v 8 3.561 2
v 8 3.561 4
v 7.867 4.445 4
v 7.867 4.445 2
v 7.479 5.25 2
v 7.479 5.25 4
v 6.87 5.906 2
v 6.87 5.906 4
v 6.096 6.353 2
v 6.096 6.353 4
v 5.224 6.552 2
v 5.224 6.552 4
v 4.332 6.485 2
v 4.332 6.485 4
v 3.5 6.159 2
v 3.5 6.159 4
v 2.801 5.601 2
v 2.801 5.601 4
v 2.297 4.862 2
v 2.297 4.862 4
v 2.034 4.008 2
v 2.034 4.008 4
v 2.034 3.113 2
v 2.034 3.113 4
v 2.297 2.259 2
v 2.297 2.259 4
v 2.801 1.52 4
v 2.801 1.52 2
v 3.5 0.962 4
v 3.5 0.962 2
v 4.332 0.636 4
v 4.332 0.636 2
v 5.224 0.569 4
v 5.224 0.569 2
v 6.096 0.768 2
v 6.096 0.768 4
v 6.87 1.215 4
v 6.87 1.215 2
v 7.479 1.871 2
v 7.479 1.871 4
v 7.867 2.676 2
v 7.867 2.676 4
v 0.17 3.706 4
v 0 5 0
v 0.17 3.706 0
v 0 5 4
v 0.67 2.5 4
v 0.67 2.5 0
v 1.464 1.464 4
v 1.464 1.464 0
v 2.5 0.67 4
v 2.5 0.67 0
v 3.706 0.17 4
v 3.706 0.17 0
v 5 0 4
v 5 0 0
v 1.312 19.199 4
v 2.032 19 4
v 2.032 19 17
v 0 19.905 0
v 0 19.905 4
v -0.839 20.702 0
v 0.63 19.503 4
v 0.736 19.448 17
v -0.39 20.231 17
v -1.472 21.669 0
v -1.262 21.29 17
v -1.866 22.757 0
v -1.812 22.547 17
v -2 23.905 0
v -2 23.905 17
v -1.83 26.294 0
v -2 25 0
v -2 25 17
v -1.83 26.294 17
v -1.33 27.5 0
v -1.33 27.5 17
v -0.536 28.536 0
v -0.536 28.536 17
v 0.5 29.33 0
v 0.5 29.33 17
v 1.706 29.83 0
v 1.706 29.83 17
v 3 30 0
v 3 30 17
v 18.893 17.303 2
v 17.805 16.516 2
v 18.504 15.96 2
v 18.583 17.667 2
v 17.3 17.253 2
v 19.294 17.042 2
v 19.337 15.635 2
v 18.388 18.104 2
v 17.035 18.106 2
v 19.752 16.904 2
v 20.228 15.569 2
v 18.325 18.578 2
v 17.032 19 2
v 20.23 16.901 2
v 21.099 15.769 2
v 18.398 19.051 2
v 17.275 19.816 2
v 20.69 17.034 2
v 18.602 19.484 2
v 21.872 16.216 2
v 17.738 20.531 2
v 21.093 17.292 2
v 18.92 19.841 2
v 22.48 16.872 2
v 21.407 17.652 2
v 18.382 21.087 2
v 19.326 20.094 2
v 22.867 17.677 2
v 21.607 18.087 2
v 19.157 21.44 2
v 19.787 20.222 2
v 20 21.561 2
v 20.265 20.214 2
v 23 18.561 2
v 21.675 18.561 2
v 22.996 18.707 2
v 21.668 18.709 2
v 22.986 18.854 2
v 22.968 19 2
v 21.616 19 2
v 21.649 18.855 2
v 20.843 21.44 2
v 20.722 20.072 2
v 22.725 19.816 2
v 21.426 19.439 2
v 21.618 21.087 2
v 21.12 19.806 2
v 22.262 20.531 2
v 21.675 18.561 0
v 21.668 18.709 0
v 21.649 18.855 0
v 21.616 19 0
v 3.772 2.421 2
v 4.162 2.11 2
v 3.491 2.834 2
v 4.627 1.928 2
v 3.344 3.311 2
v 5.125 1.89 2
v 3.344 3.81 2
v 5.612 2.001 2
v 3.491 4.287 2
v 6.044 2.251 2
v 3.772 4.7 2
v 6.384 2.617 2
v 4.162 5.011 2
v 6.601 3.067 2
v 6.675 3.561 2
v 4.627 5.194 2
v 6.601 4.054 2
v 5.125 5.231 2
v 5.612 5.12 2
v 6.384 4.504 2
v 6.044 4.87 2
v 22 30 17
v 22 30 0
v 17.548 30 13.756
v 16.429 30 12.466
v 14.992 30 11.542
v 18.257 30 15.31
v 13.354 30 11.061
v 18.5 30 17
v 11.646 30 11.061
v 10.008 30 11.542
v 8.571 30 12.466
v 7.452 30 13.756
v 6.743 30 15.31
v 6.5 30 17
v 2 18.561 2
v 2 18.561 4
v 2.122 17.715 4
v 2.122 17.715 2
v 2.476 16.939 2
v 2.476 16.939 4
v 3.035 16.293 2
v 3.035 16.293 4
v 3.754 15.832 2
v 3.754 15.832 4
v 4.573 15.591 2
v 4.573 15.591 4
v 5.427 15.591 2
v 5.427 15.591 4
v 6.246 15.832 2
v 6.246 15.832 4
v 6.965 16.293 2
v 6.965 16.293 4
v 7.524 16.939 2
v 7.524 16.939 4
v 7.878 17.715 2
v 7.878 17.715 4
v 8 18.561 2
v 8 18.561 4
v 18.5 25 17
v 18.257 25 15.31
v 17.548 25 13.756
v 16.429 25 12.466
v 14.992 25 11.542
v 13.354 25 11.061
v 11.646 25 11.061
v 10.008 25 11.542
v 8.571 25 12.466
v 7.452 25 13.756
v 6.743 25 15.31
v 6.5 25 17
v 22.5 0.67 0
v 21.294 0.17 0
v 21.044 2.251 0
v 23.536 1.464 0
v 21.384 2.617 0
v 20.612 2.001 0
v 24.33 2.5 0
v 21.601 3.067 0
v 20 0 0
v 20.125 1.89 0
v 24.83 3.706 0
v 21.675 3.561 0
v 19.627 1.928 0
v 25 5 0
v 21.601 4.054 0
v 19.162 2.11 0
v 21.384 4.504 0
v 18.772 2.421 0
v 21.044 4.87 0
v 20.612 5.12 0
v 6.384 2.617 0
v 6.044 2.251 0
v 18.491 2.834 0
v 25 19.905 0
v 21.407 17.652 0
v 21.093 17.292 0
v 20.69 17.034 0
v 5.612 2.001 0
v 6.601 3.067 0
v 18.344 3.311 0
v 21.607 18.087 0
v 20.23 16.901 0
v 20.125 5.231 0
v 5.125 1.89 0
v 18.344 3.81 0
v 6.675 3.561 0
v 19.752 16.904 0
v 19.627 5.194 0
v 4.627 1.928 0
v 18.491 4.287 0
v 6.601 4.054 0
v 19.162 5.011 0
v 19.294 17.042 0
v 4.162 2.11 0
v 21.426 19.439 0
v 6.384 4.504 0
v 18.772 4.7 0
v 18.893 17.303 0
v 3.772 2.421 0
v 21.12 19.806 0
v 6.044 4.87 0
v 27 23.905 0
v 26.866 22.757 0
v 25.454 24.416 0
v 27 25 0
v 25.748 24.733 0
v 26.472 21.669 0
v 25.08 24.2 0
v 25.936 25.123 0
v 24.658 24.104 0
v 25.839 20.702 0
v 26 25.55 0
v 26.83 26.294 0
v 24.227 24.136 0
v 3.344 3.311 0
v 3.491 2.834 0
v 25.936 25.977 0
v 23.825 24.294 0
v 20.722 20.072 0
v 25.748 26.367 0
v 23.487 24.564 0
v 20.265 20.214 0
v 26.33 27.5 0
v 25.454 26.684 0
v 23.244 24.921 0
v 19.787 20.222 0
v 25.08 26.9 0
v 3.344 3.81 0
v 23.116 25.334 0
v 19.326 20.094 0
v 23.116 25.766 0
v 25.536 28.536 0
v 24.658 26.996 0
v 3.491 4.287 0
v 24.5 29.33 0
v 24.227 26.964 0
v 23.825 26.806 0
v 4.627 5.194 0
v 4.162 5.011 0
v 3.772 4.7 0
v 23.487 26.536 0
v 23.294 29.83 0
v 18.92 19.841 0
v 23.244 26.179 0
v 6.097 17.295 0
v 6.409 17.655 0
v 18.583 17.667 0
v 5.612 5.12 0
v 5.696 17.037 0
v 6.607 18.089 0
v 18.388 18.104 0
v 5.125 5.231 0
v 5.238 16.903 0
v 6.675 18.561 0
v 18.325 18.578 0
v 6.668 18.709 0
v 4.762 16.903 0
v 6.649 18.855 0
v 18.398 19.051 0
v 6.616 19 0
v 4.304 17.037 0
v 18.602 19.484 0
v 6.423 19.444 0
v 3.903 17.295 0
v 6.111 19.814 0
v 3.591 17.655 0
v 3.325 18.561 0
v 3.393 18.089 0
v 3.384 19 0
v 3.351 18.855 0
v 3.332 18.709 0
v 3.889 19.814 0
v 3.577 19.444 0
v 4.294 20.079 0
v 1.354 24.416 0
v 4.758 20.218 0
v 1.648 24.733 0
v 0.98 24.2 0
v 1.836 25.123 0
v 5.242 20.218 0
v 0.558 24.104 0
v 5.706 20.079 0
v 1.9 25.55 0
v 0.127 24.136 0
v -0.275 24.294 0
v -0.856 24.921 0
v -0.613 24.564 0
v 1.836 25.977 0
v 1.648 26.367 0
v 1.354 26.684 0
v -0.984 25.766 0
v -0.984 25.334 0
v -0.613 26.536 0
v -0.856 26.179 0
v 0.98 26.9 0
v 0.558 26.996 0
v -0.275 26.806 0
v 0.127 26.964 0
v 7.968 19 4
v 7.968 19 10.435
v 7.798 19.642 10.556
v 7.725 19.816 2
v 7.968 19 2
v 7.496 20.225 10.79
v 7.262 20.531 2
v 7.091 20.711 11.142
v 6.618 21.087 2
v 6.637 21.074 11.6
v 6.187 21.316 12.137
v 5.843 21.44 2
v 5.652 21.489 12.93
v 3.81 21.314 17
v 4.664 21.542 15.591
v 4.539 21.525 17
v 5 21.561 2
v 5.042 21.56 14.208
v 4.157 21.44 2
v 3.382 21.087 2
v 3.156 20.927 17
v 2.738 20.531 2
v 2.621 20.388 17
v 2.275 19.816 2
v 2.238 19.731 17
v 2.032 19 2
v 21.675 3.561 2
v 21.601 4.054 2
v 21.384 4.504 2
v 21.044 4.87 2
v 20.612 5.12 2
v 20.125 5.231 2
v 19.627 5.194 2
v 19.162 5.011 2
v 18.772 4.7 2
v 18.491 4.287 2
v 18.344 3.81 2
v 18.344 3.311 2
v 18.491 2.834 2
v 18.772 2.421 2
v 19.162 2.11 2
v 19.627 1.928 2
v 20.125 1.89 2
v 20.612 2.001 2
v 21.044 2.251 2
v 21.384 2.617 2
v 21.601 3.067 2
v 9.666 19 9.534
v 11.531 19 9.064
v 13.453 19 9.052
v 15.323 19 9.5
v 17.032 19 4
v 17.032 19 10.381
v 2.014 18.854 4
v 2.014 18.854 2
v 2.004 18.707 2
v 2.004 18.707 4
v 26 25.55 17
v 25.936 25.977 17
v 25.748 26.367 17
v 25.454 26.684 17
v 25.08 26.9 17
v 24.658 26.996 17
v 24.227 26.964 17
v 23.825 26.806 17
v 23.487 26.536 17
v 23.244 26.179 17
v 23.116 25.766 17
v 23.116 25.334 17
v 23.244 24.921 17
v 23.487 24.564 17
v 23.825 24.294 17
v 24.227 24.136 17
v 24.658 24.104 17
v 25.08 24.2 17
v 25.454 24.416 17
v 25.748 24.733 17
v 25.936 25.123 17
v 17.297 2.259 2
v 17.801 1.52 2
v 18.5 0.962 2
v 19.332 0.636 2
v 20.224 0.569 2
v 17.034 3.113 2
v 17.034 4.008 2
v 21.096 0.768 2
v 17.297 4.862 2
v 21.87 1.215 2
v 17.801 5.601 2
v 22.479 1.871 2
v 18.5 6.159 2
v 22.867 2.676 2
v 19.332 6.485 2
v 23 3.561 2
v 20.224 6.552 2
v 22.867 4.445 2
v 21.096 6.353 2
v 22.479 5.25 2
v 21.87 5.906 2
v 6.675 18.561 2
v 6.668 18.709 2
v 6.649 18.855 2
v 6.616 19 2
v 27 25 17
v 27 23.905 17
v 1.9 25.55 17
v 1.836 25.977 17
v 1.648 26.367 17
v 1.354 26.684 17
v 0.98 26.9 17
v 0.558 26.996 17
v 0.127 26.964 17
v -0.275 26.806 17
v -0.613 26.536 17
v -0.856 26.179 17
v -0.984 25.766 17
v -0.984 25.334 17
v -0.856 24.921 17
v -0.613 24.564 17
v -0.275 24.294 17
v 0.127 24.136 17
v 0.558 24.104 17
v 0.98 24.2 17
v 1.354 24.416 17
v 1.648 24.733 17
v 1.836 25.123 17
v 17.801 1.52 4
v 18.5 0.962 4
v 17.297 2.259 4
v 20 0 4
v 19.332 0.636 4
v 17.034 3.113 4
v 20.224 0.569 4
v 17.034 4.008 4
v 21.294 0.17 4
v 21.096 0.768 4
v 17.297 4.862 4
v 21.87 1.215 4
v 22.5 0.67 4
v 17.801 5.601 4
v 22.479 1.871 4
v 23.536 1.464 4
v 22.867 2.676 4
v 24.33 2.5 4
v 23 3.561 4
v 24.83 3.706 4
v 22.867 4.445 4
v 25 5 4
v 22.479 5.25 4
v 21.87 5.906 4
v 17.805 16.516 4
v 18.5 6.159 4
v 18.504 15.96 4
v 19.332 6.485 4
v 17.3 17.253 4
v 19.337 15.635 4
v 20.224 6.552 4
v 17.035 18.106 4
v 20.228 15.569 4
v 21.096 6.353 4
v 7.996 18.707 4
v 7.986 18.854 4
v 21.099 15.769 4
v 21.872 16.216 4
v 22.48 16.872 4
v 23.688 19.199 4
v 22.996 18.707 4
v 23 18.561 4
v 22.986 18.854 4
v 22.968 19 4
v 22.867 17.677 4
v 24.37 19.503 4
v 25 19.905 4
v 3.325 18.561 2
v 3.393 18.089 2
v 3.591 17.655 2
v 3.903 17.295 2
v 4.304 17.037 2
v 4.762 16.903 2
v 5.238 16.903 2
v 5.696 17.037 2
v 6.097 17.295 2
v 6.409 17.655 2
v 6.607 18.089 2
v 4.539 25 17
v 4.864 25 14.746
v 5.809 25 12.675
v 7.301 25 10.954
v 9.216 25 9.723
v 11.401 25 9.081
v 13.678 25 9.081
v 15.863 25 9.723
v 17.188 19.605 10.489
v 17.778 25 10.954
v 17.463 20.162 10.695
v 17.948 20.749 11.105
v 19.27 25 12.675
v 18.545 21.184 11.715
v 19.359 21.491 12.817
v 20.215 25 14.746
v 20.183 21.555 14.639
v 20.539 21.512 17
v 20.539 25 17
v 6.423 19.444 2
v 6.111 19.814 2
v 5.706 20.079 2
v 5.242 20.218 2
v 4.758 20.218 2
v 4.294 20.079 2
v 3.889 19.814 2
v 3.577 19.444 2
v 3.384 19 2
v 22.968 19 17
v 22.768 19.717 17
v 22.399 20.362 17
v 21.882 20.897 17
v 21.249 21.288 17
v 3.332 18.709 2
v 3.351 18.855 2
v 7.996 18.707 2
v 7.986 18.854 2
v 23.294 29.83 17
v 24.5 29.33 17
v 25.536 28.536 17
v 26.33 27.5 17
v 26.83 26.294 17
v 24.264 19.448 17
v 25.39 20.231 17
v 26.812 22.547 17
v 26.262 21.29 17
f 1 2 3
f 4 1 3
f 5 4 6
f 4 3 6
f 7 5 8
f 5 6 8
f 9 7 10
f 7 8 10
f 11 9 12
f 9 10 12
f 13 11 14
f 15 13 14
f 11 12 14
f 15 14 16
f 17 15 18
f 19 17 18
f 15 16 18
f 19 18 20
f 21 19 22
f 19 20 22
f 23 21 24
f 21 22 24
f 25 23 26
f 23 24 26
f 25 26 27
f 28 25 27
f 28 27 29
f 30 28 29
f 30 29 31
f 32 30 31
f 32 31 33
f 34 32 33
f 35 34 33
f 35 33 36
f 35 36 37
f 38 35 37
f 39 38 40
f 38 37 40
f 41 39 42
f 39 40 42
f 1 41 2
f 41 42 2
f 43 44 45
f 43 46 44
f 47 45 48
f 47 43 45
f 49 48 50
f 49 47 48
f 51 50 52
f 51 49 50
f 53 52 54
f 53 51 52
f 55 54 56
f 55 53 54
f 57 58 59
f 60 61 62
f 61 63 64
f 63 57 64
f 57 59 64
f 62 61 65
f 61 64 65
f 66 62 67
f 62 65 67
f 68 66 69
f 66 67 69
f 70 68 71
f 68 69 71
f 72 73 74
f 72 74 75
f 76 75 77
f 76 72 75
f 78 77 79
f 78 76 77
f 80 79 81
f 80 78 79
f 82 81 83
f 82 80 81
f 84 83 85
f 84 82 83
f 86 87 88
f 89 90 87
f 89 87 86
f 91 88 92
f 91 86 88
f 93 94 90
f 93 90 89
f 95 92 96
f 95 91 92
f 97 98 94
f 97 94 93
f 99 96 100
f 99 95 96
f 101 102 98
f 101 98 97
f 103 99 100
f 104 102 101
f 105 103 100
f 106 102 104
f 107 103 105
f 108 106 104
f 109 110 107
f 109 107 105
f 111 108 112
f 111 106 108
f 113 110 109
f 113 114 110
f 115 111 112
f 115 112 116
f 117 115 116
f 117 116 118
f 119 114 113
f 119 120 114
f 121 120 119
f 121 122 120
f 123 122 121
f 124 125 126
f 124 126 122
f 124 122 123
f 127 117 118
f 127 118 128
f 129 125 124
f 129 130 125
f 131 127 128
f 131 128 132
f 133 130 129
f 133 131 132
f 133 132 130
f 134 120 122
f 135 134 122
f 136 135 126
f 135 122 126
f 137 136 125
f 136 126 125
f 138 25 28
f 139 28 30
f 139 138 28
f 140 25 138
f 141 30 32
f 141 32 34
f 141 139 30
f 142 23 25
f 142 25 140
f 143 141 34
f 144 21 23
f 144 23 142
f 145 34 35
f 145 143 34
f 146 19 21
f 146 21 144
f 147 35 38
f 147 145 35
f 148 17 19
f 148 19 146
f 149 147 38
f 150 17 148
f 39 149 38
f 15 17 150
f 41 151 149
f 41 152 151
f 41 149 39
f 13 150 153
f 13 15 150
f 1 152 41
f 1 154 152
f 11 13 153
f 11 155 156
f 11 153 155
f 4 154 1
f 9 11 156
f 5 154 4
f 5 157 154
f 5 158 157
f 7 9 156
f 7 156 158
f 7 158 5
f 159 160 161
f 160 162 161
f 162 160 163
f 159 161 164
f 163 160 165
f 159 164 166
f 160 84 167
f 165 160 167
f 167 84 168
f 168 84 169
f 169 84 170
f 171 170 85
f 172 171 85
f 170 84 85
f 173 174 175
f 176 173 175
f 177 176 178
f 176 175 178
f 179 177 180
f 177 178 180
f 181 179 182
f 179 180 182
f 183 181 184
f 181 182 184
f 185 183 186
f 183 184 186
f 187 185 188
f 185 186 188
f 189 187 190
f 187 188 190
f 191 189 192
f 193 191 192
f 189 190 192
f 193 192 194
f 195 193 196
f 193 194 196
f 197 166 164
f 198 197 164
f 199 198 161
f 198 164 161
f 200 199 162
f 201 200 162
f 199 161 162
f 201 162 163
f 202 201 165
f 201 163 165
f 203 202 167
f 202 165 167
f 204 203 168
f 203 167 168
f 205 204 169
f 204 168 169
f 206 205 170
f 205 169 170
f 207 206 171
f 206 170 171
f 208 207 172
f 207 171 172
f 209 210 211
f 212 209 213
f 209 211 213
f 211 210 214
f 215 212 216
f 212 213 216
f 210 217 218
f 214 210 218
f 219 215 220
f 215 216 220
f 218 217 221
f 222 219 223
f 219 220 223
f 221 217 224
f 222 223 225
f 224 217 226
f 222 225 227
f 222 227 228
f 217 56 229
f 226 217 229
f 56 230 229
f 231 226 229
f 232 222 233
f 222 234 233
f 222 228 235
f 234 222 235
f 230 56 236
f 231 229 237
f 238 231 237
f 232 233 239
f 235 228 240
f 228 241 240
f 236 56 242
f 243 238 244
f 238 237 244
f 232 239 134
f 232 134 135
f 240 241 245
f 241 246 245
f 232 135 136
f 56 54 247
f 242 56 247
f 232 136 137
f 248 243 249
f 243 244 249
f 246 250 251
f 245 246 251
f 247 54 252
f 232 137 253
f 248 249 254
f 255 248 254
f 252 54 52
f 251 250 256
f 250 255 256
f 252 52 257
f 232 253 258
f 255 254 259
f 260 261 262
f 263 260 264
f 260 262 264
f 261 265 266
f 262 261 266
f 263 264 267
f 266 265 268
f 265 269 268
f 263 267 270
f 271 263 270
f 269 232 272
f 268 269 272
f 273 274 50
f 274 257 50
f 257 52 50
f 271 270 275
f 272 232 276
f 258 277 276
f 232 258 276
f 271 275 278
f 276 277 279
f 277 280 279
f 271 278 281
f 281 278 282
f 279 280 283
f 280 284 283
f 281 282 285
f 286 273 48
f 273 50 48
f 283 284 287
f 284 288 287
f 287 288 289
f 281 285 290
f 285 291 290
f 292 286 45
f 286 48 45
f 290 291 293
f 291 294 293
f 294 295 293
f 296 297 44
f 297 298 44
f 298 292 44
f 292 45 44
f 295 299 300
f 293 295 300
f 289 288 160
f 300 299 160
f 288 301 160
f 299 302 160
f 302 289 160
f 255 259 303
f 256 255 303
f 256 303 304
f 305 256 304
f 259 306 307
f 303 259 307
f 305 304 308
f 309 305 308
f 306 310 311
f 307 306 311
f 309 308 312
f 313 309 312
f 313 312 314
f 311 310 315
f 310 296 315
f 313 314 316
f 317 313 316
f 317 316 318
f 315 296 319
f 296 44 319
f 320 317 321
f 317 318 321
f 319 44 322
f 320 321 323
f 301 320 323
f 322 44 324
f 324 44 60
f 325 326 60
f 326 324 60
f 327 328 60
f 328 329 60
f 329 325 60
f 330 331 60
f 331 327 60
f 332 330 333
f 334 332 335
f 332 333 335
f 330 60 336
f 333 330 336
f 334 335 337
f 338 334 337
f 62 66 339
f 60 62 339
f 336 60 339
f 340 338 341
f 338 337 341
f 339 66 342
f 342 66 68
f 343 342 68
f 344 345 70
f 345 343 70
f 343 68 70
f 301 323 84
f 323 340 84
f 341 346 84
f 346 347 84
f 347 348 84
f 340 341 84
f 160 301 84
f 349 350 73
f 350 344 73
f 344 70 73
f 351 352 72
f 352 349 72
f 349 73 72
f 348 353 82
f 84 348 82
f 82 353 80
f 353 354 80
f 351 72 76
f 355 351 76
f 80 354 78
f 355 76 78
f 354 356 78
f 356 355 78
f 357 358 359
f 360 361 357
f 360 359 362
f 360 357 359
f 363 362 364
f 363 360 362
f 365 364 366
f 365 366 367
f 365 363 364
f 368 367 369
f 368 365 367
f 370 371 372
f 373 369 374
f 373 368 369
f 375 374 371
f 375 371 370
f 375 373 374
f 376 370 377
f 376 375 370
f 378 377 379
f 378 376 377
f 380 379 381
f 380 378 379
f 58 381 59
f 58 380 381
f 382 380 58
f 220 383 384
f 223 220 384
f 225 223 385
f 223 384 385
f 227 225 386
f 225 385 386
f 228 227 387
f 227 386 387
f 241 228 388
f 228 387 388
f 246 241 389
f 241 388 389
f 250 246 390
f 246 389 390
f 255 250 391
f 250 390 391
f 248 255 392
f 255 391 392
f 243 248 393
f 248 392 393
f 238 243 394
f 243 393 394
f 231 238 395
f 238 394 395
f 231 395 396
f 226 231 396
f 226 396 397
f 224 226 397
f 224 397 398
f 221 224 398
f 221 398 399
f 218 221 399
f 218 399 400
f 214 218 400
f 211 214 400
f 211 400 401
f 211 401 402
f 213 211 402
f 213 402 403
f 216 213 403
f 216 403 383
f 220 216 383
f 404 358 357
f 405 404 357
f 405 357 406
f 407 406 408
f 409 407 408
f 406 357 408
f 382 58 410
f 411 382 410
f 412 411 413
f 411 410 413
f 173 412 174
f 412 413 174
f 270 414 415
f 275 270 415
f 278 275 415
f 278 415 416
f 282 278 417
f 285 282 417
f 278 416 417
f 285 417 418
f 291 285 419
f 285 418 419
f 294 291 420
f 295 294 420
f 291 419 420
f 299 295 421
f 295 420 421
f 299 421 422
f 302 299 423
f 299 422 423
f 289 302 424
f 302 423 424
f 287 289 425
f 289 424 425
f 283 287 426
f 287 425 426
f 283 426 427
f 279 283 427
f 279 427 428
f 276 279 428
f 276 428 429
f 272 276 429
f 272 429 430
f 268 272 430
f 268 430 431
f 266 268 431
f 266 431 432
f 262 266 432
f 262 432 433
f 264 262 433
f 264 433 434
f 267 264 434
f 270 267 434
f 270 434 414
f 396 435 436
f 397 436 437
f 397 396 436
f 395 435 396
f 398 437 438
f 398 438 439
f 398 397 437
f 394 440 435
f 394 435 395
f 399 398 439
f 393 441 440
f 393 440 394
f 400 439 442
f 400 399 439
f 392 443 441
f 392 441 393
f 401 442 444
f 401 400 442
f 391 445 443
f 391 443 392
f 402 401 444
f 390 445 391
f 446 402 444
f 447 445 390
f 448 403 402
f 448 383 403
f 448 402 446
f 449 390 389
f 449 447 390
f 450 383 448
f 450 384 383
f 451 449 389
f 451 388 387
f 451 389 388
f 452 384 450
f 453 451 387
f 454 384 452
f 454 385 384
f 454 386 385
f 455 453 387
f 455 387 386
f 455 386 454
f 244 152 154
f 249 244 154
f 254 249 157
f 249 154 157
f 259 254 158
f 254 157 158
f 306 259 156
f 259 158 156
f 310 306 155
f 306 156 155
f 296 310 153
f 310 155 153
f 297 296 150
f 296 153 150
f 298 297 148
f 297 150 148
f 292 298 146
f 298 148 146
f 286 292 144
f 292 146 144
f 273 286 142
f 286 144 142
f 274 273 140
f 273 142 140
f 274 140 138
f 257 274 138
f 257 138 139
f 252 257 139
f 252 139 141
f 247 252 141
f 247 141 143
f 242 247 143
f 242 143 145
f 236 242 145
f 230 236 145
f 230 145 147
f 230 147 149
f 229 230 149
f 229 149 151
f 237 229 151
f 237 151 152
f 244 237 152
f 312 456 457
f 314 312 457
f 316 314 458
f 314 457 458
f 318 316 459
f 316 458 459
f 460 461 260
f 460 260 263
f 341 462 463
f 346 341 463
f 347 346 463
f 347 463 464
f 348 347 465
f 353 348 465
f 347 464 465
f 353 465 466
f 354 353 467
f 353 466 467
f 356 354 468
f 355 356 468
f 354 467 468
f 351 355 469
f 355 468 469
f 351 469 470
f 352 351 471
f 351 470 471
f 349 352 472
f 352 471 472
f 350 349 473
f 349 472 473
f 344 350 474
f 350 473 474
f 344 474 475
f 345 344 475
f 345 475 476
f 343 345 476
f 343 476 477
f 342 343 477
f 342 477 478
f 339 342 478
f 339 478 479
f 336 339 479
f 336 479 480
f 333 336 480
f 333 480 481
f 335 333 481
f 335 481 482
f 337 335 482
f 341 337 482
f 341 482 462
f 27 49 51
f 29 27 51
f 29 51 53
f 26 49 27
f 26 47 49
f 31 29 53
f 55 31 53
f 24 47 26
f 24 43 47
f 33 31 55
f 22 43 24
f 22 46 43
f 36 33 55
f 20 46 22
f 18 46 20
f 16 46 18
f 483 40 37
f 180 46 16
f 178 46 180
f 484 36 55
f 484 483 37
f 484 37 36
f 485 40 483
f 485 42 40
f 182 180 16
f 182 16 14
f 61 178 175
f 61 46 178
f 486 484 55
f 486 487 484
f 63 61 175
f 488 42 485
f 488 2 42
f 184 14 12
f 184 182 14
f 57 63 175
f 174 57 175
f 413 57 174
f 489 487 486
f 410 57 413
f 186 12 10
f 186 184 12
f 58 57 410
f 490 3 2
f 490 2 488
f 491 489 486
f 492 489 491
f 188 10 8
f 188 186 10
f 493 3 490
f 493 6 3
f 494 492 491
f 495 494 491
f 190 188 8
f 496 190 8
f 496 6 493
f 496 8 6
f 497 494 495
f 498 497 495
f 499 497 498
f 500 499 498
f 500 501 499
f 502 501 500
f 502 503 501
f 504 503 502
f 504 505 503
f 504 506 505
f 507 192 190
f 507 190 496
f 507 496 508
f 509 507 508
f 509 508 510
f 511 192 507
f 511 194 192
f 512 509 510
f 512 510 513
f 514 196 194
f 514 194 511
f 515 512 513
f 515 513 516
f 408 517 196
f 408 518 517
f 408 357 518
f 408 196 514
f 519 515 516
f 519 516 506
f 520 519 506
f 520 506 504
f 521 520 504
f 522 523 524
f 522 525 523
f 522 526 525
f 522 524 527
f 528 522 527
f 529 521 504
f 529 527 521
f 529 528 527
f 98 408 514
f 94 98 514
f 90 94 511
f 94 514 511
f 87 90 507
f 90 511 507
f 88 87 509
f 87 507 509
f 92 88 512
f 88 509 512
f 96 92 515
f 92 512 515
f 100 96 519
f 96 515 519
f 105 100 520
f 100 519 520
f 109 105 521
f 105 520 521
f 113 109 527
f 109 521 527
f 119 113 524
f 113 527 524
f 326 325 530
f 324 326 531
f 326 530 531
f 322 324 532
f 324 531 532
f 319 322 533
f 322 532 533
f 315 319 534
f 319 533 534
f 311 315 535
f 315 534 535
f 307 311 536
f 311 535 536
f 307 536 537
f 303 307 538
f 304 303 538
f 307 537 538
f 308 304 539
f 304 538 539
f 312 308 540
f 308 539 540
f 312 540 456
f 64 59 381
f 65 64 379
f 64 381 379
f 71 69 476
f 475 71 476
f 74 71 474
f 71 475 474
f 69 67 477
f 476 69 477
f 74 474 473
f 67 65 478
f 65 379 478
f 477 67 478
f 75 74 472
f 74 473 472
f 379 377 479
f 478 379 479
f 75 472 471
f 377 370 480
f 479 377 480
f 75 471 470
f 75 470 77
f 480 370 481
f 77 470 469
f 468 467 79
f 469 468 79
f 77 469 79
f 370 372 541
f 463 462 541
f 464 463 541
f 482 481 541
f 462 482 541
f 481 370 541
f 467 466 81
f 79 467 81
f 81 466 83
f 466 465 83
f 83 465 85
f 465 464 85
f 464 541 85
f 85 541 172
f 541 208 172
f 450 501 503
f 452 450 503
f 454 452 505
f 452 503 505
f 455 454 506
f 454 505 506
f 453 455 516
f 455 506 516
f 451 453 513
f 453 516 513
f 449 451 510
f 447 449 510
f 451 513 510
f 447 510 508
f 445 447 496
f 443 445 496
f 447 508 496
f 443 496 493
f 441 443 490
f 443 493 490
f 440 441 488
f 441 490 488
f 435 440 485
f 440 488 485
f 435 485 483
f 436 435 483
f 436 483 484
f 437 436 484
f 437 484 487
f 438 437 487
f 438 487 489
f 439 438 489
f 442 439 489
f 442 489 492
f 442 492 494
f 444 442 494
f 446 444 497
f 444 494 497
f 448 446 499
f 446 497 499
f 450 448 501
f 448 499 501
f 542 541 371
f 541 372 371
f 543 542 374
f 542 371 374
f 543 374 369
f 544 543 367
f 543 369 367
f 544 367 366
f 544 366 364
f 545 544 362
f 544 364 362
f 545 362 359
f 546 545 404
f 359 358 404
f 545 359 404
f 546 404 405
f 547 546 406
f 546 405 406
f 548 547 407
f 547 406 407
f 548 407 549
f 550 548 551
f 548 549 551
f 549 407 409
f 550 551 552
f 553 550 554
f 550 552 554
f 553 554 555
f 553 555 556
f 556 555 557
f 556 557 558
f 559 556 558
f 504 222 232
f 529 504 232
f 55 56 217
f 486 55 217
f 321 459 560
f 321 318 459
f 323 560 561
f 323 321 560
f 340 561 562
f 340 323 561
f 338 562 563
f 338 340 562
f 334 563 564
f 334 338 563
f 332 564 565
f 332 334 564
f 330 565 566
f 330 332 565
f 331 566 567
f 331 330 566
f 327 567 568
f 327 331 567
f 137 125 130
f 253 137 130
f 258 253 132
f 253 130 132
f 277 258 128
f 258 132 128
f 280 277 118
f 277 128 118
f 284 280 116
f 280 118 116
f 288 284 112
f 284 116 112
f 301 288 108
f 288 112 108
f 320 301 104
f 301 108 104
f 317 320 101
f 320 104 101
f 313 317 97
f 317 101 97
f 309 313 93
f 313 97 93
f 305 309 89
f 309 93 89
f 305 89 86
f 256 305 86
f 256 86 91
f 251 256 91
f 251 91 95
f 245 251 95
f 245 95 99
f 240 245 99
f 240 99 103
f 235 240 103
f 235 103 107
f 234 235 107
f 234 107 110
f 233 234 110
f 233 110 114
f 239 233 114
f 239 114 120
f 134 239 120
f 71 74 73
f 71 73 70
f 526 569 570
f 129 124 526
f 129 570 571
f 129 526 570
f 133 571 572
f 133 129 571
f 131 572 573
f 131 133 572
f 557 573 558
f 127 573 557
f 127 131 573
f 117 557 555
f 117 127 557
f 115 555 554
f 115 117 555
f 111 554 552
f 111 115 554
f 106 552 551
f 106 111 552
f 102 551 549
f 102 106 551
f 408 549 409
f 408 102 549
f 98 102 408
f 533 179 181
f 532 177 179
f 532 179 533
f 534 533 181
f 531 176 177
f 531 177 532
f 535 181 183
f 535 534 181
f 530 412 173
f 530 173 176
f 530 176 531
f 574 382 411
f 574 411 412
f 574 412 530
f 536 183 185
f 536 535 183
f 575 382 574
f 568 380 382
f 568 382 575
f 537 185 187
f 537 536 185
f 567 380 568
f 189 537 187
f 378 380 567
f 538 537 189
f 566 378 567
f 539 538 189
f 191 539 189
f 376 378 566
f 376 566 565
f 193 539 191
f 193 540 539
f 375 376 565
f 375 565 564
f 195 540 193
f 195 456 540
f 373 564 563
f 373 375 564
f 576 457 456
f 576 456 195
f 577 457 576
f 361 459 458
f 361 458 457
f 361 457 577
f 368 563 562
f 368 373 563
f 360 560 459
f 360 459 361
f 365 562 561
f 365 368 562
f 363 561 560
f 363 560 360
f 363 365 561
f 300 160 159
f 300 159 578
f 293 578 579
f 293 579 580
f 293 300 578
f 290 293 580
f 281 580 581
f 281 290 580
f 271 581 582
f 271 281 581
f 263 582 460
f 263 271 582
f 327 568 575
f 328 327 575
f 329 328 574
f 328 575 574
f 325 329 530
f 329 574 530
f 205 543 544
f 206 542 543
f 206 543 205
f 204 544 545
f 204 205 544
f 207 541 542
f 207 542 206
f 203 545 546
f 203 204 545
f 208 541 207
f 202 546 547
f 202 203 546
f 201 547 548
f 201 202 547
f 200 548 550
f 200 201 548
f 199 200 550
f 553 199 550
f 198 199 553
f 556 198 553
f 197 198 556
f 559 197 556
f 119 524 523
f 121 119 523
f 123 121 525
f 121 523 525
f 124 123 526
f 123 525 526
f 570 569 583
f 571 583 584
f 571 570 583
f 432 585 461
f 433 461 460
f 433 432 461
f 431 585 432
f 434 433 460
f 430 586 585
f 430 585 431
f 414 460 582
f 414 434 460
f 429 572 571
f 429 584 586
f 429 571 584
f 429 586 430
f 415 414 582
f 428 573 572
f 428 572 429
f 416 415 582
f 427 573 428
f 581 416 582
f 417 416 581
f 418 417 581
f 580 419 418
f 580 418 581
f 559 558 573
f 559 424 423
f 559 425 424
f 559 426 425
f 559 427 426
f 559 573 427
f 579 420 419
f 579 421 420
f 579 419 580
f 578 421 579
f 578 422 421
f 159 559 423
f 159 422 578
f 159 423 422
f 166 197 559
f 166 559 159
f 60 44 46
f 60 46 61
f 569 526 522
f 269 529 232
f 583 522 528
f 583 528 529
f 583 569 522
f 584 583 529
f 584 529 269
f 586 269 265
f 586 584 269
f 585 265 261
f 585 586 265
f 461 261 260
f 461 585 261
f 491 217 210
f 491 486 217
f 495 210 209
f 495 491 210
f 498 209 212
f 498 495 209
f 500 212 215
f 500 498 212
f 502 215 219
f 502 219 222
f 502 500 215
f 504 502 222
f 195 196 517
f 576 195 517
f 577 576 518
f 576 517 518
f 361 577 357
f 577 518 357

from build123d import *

# Parameters (mm, degrees)
F0_W           = 25
F0_H           = 30
F1_DEPTH       = 4
F2_W           = 25
F2_H           = 11
F3_DEPTH       = 13
F4_R           = 1.675
F5_DEPTH       = 25
F5_DEPTH_BACK  = 25
F7_DEPTH       = 6
F8_R           = 8
F9_DEPTH       = 6
F4_R_2         = 3
F10_DEPTH      = 2
F10_DEPTH_BACK = 25
F11_R          = 5
F13_DEPTH      = 2
F14_W          = 11
F14_H          = 17
F15_DEPTH      = 2
F16_R          = 1.45
F17_DEPTH      = 25
F18_T1_DEPTH   = 42
F18_T6_DEPTH   = 41.5273716251
F18_T11_DEPTH  = 41.5273716251
F18_T16_DEPTH  = 41.5273716251
F18_T21_DEPTH  = 41.5273716251


# Not quite as in the source:
# - a fillet or chamfer that OpenCascade refuses, or shapes differently, is made with other operations: its cross-section is extruded or revolved along the edge and cut away or added


with BuildPart() as f1:
    # F0 (on Top) → F1 (new body)
    with BuildSketch(Plane.XY):
        with Locations((12.5, 15)):
            Rectangle(F0_W, F0_H)
    extrude(amount=F1_DEPTH)

    # F2 (on face) → F3 (join)
    with BuildSketch(Plane.XY.offset(4)):
        with Locations((12.5, 24.5)):
            Rectangle(F2_W, F2_H)
    extrude(amount=F3_DEPTH)

    # F4 (on face) → F5 (cut, two sides)
    with BuildSketch(Plane.XY.offset(4)) as f5_sk:
        with BuildLine():
            ThreePointArc((3.325, 18.5605346784), (5, 16.8855346784), (6.675, 18.5605346784))
            ThreePointArc((6.675, 18.5605346784), (6.6602655711, 18.7822174099), (6.6163215123, 19))
            Line((6.6163215123, 19), (3.3836784877, 19))
            ThreePointArc((3.3836784877, 19), (3.3397344289, 18.7822174099), (3.325, 18.5605346784))
        make_face()
        with BuildLine():
            ThreePointArc((21.6163215123, 19), (20, 20.2355346784), (18.3836784877, 19))
            Line((18.3836784877, 19), (21.6163215123, 19))
        make_face()
        with BuildLine():
            Line((21.6163215123, 19), (18.3836784877, 19))
            ThreePointArc((18.3836784877, 19), (19.7783172685, 16.9002691073), (21.675, 18.5605346784))
            ThreePointArc((21.675, 18.5605346784), (21.6602655711, 18.7822174099), (21.6163215123, 19))
        make_face()
        with Locations((20, 3.5605346784)):
            Circle(F4_R)
        with Locations((5, 3.5605346784)):
            Circle(F4_R)
        with BuildLine():
            Line((3.3836784877, 19), (6.6163215123, 19))
            ThreePointArc((6.6163215123, 19), (5, 20.2355346784), (3.3836784877, 19))
        make_face()
    extrude(amount=-F5_DEPTH, mode=Mode.SUBTRACT)
    extrude(f5_sk.sketch, amount=F5_DEPTH_BACK, mode=Mode.SUBTRACT)

    # F6 (on face) → F7 (cut)
    with BuildSketch(Plane(origin=(0, 30, 0), x_dir=(-1, 0, 0), z_dir=(0, 1, 0))):
        with BuildLine():
            ThreePointArc((-18.5, 17), (-12.5, 11), (-6.5, 17))
            Line((-6.5, 17), (-18.5, 17))
        make_face()
    extrude(amount=-F7_DEPTH, mode=Mode.SUBTRACT)

    # F8 (on face) → F9 (cut)
    with BuildSketch(Plane.XZ.offset(-19)):
        with Locations((12.5394891948, 17)):
            Circle(F8_R)
    extrude(amount=-F9_DEPTH, mode=Mode.SUBTRACT)

    # F4 (on face) → F10 (cut, two sides)
    with BuildSketch(Plane.XY.offset(4)) as f10_sk:
        with BuildLine():
            ThreePointArc((3.3836784877, 19), (5, 20.2355346784), (6.6163215123, 19))
            Line((6.6163215123, 19), (7.9676371461, 19))
            ThreePointArc((7.9676371461, 19), (5, 21.5605346784), (2.0323628539, 19))
            Line((2.0323628539, 19), (3.3836784877, 19))
        make_face()
        with BuildLine():
            Line((2, 18.5605346784), (3.325, 18.5605346784))
            ThreePointArc((3.325, 18.5605346784), (3.3397344289, 18.7822174099), (3.3836784877, 19))
            Line((3.3836784877, 19), (2.0323628539, 19))
            ThreePointArc((2.0323628539, 19), (2.0081016529, 18.7808623453), (2, 18.5605346784))
        make_face()
        with BuildLine():
            ThreePointArc((6.6163215123, 19), (6.6602655711, 18.7822174099), (6.675, 18.5605346784))
            ThreePointArc((6.675, 18.5605346784), (5, 16.8855346784), (3.325, 18.5605346784))
            Line((3.325, 18.5605346784), (2, 18.5605346784))
            ThreePointArc((2, 18.5605346784), (5, 15.5605346784), (8, 18.5605346784))
            ThreePointArc((8, 18.5605346784), (7.9918983471, 18.7808623453), (7.9676371461, 19))
            Line((7.9676371461, 19), (6.6163215123, 19))
        make_face()
        with BuildLine():
            ThreePointArc((22.9676371461, 19), (20, 21.5605346784), (17.0323628539, 19))
            Line((17.0323628539, 19), (18.3836784877, 19))
            ThreePointArc((18.3836784877, 19), (20, 20.2355346784), (21.6163215123, 19))
            Line((21.6163215123, 19), (22.9676371461, 19))
        make_face()
        with BuildLine():
            Line((18.3836784877, 19), (17.0323628539, 19))
            ThreePointArc((17.0323628539, 19), (19.7796723331, 15.5686363313), (23, 18.5605346784))
            ThreePointArc((23, 18.5605346784), (22.9918983471, 18.7808623453), (22.9676371461, 19))
            Line((22.9676371461, 19), (21.6163215123, 19))
            ThreePointArc((21.6163215123, 19), (21.6602655711, 18.7822174099), (21.675, 18.5605346784))
            ThreePointArc((21.675, 18.5605346784), (19.7783172685, 16.9002691073), (18.3836784877, 19))
        make_face()
        with Locations((20, 3.5605346784)):
            Circle(F4_R_2)
        with Locations((20, 3.5605346784)):
            Circle(F4_R, mode=Mode.SUBTRACT)
        with Locations((5, 3.5605346784)):
            Circle(F4_R_2)
        with Locations((5, 3.5605346784)):
            Circle(F4_R, mode=Mode.SUBTRACT)
    extrude(amount=-F10_DEPTH, mode=Mode.SUBTRACT)
    extrude(f10_sk.sketch, amount=F10_DEPTH_BACK, mode=Mode.SUBTRACT)

    # F11
    f11_edges = [f1.edges().sort_by_distance(p)[0] for p in [
        (0, 0, 2),
        (25, 0, 2),
    ]]
    fillet(f11_edges, radius=F11_R)

    # F12 (on face) → F13 (join)
    with BuildSketch(Plane(origin=(0, 0, 0), x_dir=(0, -1, 0), z_dir=(-1, 0, 0))):
        Polygon((-30, 17), (-30, 0), (-19, 0), (-19, 4), (-19, 17), align=None)
    extrude(amount=F13_DEPTH)

    # F14 (on face) → F15 (join)
    with BuildSketch(Plane.YZ.offset(25)):
        with Locations((24.5, 8.5)):
            Rectangle(F14_W, F14_H)
    extrude(amount=F15_DEPTH)

    # F16 (on face) → F17 (cut)
    with BuildSketch(Plane.XY.offset(17)):
        with Locations((0.45, 25.55)):
            Circle(F16_R)
        with Locations((24.55, 25.55)):
            Circle(F16_R)
    extrude(amount=-F17_DEPTH, mode=Mode.SUBTRACT)

    # F18: fillet of radius 5 on 4 edges, made by hand

    # F18_s2 → F18_t1 (cut)
    with BuildSketch(Plane.XY.offset(-12.5)):
        with BuildLine():
            ThreePointArc((-2, 25), (-0.5355339059, 28.5355339059), (3, 30))
            Line((3, 30), (-2, 30))
            Line((-2, 30), (-2, 25))
        make_face()
        with BuildLine():
            ThreePointArc((22, 30), (25.5355339059, 28.5355339059), (27, 25))
            Line((27, 25), (27, 30))
            Line((27, 30), (22, 30))
        make_face()
    extrude(amount=F18_T1_DEPTH, mode=Mode.SUBTRACT)


with BuildPart() as f18_tool4:
    # F18_s5 → F18_t6 (new body)
    with BuildSketch(Plane.XY.offset(29.2636858126)):
        with BuildLine():
            ThreePointArc((2.0323628539, 19), (-0.8625241572, 20.7304298947), (-2, 23.905474325))
            Line((-2, 23.905474325), (-2, 19))
            Line((-2, 19), (2.0323628539, 19))
        make_face()
    extrude(amount=-F18_T6_DEPTH)

    split(bisect_by=Plane.XY.offset(4), keep=Keep.TOP)


with BuildPart() as f1_1:
    add(f1.part)

    # F18_t3: cut F18_tool4
    add(f18_tool4.part, mode=Mode.SUBTRACT)


with BuildPart() as f18_tool9:
    # F18_s10 → F18_t11 (new body)
    with BuildSketch(Plane.XY.offset(29.2636858126)):
        with BuildLine():
            ThreePointArc((2.0323628539, 19), (-0.8625241572, 20.7304298947), (-2, 23.905474325))
            Line((-2, 23.905474325), (-2, 19))
            Line((-2, 19), (2.0323628539, 19))
        make_face()
    extrude(amount=-F18_T11_DEPTH)

    split(bisect_by=Plane.YZ, keep=Keep.BOTTOM)


with BuildPart() as f1_2:
    add(f1_1.part)

    # F18_t8: cut F18_tool9
    add(f18_tool9.part, mode=Mode.SUBTRACT)


with BuildPart() as f18_tool14:
    # F18_s15 → F18_t16 (new body)
    with BuildSketch(Plane.XY.offset(29.2636858126)):
        with BuildLine():
            ThreePointArc((22.9676371461, 19), (25.8625241572, 20.7304298947), (27, 23.905474325))
            Line((27, 23.905474325), (27, 19))
            Line((27, 19), (22.9676371461, 19))
        make_face()
    extrude(amount=-F18_T16_DEPTH)

    split(bisect_by=Plane.XY.offset(4), keep=Keep.TOP)


with BuildPart() as f1_3:
    add(f1_2.part)

    # F18_t13: cut F18_tool14
    add(f18_tool14.part, mode=Mode.SUBTRACT)


with BuildPart() as f18_tool19:
    # F18_s20 → F18_t21 (new body)
    with BuildSketch(Plane.XY.offset(29.2636858126)):
        with BuildLine():
            ThreePointArc((22.9676371461, 19), (25.8625241572, 20.7304298947), (27, 23.905474325))
            Line((27, 23.905474325), (27, 19))
            Line((27, 19), (22.9676371461, 19))
        make_face()
    extrude(amount=-F18_T21_DEPTH)

    split(bisect_by=Plane.YZ.offset(25), keep=Keep.TOP)


with BuildPart() as f1_4:
    add(f1_3.part)

    # F18_t18: cut F18_tool19
    add(f18_tool19.part, mode=Mode.SUBTRACT)


solid = f1_4.part
